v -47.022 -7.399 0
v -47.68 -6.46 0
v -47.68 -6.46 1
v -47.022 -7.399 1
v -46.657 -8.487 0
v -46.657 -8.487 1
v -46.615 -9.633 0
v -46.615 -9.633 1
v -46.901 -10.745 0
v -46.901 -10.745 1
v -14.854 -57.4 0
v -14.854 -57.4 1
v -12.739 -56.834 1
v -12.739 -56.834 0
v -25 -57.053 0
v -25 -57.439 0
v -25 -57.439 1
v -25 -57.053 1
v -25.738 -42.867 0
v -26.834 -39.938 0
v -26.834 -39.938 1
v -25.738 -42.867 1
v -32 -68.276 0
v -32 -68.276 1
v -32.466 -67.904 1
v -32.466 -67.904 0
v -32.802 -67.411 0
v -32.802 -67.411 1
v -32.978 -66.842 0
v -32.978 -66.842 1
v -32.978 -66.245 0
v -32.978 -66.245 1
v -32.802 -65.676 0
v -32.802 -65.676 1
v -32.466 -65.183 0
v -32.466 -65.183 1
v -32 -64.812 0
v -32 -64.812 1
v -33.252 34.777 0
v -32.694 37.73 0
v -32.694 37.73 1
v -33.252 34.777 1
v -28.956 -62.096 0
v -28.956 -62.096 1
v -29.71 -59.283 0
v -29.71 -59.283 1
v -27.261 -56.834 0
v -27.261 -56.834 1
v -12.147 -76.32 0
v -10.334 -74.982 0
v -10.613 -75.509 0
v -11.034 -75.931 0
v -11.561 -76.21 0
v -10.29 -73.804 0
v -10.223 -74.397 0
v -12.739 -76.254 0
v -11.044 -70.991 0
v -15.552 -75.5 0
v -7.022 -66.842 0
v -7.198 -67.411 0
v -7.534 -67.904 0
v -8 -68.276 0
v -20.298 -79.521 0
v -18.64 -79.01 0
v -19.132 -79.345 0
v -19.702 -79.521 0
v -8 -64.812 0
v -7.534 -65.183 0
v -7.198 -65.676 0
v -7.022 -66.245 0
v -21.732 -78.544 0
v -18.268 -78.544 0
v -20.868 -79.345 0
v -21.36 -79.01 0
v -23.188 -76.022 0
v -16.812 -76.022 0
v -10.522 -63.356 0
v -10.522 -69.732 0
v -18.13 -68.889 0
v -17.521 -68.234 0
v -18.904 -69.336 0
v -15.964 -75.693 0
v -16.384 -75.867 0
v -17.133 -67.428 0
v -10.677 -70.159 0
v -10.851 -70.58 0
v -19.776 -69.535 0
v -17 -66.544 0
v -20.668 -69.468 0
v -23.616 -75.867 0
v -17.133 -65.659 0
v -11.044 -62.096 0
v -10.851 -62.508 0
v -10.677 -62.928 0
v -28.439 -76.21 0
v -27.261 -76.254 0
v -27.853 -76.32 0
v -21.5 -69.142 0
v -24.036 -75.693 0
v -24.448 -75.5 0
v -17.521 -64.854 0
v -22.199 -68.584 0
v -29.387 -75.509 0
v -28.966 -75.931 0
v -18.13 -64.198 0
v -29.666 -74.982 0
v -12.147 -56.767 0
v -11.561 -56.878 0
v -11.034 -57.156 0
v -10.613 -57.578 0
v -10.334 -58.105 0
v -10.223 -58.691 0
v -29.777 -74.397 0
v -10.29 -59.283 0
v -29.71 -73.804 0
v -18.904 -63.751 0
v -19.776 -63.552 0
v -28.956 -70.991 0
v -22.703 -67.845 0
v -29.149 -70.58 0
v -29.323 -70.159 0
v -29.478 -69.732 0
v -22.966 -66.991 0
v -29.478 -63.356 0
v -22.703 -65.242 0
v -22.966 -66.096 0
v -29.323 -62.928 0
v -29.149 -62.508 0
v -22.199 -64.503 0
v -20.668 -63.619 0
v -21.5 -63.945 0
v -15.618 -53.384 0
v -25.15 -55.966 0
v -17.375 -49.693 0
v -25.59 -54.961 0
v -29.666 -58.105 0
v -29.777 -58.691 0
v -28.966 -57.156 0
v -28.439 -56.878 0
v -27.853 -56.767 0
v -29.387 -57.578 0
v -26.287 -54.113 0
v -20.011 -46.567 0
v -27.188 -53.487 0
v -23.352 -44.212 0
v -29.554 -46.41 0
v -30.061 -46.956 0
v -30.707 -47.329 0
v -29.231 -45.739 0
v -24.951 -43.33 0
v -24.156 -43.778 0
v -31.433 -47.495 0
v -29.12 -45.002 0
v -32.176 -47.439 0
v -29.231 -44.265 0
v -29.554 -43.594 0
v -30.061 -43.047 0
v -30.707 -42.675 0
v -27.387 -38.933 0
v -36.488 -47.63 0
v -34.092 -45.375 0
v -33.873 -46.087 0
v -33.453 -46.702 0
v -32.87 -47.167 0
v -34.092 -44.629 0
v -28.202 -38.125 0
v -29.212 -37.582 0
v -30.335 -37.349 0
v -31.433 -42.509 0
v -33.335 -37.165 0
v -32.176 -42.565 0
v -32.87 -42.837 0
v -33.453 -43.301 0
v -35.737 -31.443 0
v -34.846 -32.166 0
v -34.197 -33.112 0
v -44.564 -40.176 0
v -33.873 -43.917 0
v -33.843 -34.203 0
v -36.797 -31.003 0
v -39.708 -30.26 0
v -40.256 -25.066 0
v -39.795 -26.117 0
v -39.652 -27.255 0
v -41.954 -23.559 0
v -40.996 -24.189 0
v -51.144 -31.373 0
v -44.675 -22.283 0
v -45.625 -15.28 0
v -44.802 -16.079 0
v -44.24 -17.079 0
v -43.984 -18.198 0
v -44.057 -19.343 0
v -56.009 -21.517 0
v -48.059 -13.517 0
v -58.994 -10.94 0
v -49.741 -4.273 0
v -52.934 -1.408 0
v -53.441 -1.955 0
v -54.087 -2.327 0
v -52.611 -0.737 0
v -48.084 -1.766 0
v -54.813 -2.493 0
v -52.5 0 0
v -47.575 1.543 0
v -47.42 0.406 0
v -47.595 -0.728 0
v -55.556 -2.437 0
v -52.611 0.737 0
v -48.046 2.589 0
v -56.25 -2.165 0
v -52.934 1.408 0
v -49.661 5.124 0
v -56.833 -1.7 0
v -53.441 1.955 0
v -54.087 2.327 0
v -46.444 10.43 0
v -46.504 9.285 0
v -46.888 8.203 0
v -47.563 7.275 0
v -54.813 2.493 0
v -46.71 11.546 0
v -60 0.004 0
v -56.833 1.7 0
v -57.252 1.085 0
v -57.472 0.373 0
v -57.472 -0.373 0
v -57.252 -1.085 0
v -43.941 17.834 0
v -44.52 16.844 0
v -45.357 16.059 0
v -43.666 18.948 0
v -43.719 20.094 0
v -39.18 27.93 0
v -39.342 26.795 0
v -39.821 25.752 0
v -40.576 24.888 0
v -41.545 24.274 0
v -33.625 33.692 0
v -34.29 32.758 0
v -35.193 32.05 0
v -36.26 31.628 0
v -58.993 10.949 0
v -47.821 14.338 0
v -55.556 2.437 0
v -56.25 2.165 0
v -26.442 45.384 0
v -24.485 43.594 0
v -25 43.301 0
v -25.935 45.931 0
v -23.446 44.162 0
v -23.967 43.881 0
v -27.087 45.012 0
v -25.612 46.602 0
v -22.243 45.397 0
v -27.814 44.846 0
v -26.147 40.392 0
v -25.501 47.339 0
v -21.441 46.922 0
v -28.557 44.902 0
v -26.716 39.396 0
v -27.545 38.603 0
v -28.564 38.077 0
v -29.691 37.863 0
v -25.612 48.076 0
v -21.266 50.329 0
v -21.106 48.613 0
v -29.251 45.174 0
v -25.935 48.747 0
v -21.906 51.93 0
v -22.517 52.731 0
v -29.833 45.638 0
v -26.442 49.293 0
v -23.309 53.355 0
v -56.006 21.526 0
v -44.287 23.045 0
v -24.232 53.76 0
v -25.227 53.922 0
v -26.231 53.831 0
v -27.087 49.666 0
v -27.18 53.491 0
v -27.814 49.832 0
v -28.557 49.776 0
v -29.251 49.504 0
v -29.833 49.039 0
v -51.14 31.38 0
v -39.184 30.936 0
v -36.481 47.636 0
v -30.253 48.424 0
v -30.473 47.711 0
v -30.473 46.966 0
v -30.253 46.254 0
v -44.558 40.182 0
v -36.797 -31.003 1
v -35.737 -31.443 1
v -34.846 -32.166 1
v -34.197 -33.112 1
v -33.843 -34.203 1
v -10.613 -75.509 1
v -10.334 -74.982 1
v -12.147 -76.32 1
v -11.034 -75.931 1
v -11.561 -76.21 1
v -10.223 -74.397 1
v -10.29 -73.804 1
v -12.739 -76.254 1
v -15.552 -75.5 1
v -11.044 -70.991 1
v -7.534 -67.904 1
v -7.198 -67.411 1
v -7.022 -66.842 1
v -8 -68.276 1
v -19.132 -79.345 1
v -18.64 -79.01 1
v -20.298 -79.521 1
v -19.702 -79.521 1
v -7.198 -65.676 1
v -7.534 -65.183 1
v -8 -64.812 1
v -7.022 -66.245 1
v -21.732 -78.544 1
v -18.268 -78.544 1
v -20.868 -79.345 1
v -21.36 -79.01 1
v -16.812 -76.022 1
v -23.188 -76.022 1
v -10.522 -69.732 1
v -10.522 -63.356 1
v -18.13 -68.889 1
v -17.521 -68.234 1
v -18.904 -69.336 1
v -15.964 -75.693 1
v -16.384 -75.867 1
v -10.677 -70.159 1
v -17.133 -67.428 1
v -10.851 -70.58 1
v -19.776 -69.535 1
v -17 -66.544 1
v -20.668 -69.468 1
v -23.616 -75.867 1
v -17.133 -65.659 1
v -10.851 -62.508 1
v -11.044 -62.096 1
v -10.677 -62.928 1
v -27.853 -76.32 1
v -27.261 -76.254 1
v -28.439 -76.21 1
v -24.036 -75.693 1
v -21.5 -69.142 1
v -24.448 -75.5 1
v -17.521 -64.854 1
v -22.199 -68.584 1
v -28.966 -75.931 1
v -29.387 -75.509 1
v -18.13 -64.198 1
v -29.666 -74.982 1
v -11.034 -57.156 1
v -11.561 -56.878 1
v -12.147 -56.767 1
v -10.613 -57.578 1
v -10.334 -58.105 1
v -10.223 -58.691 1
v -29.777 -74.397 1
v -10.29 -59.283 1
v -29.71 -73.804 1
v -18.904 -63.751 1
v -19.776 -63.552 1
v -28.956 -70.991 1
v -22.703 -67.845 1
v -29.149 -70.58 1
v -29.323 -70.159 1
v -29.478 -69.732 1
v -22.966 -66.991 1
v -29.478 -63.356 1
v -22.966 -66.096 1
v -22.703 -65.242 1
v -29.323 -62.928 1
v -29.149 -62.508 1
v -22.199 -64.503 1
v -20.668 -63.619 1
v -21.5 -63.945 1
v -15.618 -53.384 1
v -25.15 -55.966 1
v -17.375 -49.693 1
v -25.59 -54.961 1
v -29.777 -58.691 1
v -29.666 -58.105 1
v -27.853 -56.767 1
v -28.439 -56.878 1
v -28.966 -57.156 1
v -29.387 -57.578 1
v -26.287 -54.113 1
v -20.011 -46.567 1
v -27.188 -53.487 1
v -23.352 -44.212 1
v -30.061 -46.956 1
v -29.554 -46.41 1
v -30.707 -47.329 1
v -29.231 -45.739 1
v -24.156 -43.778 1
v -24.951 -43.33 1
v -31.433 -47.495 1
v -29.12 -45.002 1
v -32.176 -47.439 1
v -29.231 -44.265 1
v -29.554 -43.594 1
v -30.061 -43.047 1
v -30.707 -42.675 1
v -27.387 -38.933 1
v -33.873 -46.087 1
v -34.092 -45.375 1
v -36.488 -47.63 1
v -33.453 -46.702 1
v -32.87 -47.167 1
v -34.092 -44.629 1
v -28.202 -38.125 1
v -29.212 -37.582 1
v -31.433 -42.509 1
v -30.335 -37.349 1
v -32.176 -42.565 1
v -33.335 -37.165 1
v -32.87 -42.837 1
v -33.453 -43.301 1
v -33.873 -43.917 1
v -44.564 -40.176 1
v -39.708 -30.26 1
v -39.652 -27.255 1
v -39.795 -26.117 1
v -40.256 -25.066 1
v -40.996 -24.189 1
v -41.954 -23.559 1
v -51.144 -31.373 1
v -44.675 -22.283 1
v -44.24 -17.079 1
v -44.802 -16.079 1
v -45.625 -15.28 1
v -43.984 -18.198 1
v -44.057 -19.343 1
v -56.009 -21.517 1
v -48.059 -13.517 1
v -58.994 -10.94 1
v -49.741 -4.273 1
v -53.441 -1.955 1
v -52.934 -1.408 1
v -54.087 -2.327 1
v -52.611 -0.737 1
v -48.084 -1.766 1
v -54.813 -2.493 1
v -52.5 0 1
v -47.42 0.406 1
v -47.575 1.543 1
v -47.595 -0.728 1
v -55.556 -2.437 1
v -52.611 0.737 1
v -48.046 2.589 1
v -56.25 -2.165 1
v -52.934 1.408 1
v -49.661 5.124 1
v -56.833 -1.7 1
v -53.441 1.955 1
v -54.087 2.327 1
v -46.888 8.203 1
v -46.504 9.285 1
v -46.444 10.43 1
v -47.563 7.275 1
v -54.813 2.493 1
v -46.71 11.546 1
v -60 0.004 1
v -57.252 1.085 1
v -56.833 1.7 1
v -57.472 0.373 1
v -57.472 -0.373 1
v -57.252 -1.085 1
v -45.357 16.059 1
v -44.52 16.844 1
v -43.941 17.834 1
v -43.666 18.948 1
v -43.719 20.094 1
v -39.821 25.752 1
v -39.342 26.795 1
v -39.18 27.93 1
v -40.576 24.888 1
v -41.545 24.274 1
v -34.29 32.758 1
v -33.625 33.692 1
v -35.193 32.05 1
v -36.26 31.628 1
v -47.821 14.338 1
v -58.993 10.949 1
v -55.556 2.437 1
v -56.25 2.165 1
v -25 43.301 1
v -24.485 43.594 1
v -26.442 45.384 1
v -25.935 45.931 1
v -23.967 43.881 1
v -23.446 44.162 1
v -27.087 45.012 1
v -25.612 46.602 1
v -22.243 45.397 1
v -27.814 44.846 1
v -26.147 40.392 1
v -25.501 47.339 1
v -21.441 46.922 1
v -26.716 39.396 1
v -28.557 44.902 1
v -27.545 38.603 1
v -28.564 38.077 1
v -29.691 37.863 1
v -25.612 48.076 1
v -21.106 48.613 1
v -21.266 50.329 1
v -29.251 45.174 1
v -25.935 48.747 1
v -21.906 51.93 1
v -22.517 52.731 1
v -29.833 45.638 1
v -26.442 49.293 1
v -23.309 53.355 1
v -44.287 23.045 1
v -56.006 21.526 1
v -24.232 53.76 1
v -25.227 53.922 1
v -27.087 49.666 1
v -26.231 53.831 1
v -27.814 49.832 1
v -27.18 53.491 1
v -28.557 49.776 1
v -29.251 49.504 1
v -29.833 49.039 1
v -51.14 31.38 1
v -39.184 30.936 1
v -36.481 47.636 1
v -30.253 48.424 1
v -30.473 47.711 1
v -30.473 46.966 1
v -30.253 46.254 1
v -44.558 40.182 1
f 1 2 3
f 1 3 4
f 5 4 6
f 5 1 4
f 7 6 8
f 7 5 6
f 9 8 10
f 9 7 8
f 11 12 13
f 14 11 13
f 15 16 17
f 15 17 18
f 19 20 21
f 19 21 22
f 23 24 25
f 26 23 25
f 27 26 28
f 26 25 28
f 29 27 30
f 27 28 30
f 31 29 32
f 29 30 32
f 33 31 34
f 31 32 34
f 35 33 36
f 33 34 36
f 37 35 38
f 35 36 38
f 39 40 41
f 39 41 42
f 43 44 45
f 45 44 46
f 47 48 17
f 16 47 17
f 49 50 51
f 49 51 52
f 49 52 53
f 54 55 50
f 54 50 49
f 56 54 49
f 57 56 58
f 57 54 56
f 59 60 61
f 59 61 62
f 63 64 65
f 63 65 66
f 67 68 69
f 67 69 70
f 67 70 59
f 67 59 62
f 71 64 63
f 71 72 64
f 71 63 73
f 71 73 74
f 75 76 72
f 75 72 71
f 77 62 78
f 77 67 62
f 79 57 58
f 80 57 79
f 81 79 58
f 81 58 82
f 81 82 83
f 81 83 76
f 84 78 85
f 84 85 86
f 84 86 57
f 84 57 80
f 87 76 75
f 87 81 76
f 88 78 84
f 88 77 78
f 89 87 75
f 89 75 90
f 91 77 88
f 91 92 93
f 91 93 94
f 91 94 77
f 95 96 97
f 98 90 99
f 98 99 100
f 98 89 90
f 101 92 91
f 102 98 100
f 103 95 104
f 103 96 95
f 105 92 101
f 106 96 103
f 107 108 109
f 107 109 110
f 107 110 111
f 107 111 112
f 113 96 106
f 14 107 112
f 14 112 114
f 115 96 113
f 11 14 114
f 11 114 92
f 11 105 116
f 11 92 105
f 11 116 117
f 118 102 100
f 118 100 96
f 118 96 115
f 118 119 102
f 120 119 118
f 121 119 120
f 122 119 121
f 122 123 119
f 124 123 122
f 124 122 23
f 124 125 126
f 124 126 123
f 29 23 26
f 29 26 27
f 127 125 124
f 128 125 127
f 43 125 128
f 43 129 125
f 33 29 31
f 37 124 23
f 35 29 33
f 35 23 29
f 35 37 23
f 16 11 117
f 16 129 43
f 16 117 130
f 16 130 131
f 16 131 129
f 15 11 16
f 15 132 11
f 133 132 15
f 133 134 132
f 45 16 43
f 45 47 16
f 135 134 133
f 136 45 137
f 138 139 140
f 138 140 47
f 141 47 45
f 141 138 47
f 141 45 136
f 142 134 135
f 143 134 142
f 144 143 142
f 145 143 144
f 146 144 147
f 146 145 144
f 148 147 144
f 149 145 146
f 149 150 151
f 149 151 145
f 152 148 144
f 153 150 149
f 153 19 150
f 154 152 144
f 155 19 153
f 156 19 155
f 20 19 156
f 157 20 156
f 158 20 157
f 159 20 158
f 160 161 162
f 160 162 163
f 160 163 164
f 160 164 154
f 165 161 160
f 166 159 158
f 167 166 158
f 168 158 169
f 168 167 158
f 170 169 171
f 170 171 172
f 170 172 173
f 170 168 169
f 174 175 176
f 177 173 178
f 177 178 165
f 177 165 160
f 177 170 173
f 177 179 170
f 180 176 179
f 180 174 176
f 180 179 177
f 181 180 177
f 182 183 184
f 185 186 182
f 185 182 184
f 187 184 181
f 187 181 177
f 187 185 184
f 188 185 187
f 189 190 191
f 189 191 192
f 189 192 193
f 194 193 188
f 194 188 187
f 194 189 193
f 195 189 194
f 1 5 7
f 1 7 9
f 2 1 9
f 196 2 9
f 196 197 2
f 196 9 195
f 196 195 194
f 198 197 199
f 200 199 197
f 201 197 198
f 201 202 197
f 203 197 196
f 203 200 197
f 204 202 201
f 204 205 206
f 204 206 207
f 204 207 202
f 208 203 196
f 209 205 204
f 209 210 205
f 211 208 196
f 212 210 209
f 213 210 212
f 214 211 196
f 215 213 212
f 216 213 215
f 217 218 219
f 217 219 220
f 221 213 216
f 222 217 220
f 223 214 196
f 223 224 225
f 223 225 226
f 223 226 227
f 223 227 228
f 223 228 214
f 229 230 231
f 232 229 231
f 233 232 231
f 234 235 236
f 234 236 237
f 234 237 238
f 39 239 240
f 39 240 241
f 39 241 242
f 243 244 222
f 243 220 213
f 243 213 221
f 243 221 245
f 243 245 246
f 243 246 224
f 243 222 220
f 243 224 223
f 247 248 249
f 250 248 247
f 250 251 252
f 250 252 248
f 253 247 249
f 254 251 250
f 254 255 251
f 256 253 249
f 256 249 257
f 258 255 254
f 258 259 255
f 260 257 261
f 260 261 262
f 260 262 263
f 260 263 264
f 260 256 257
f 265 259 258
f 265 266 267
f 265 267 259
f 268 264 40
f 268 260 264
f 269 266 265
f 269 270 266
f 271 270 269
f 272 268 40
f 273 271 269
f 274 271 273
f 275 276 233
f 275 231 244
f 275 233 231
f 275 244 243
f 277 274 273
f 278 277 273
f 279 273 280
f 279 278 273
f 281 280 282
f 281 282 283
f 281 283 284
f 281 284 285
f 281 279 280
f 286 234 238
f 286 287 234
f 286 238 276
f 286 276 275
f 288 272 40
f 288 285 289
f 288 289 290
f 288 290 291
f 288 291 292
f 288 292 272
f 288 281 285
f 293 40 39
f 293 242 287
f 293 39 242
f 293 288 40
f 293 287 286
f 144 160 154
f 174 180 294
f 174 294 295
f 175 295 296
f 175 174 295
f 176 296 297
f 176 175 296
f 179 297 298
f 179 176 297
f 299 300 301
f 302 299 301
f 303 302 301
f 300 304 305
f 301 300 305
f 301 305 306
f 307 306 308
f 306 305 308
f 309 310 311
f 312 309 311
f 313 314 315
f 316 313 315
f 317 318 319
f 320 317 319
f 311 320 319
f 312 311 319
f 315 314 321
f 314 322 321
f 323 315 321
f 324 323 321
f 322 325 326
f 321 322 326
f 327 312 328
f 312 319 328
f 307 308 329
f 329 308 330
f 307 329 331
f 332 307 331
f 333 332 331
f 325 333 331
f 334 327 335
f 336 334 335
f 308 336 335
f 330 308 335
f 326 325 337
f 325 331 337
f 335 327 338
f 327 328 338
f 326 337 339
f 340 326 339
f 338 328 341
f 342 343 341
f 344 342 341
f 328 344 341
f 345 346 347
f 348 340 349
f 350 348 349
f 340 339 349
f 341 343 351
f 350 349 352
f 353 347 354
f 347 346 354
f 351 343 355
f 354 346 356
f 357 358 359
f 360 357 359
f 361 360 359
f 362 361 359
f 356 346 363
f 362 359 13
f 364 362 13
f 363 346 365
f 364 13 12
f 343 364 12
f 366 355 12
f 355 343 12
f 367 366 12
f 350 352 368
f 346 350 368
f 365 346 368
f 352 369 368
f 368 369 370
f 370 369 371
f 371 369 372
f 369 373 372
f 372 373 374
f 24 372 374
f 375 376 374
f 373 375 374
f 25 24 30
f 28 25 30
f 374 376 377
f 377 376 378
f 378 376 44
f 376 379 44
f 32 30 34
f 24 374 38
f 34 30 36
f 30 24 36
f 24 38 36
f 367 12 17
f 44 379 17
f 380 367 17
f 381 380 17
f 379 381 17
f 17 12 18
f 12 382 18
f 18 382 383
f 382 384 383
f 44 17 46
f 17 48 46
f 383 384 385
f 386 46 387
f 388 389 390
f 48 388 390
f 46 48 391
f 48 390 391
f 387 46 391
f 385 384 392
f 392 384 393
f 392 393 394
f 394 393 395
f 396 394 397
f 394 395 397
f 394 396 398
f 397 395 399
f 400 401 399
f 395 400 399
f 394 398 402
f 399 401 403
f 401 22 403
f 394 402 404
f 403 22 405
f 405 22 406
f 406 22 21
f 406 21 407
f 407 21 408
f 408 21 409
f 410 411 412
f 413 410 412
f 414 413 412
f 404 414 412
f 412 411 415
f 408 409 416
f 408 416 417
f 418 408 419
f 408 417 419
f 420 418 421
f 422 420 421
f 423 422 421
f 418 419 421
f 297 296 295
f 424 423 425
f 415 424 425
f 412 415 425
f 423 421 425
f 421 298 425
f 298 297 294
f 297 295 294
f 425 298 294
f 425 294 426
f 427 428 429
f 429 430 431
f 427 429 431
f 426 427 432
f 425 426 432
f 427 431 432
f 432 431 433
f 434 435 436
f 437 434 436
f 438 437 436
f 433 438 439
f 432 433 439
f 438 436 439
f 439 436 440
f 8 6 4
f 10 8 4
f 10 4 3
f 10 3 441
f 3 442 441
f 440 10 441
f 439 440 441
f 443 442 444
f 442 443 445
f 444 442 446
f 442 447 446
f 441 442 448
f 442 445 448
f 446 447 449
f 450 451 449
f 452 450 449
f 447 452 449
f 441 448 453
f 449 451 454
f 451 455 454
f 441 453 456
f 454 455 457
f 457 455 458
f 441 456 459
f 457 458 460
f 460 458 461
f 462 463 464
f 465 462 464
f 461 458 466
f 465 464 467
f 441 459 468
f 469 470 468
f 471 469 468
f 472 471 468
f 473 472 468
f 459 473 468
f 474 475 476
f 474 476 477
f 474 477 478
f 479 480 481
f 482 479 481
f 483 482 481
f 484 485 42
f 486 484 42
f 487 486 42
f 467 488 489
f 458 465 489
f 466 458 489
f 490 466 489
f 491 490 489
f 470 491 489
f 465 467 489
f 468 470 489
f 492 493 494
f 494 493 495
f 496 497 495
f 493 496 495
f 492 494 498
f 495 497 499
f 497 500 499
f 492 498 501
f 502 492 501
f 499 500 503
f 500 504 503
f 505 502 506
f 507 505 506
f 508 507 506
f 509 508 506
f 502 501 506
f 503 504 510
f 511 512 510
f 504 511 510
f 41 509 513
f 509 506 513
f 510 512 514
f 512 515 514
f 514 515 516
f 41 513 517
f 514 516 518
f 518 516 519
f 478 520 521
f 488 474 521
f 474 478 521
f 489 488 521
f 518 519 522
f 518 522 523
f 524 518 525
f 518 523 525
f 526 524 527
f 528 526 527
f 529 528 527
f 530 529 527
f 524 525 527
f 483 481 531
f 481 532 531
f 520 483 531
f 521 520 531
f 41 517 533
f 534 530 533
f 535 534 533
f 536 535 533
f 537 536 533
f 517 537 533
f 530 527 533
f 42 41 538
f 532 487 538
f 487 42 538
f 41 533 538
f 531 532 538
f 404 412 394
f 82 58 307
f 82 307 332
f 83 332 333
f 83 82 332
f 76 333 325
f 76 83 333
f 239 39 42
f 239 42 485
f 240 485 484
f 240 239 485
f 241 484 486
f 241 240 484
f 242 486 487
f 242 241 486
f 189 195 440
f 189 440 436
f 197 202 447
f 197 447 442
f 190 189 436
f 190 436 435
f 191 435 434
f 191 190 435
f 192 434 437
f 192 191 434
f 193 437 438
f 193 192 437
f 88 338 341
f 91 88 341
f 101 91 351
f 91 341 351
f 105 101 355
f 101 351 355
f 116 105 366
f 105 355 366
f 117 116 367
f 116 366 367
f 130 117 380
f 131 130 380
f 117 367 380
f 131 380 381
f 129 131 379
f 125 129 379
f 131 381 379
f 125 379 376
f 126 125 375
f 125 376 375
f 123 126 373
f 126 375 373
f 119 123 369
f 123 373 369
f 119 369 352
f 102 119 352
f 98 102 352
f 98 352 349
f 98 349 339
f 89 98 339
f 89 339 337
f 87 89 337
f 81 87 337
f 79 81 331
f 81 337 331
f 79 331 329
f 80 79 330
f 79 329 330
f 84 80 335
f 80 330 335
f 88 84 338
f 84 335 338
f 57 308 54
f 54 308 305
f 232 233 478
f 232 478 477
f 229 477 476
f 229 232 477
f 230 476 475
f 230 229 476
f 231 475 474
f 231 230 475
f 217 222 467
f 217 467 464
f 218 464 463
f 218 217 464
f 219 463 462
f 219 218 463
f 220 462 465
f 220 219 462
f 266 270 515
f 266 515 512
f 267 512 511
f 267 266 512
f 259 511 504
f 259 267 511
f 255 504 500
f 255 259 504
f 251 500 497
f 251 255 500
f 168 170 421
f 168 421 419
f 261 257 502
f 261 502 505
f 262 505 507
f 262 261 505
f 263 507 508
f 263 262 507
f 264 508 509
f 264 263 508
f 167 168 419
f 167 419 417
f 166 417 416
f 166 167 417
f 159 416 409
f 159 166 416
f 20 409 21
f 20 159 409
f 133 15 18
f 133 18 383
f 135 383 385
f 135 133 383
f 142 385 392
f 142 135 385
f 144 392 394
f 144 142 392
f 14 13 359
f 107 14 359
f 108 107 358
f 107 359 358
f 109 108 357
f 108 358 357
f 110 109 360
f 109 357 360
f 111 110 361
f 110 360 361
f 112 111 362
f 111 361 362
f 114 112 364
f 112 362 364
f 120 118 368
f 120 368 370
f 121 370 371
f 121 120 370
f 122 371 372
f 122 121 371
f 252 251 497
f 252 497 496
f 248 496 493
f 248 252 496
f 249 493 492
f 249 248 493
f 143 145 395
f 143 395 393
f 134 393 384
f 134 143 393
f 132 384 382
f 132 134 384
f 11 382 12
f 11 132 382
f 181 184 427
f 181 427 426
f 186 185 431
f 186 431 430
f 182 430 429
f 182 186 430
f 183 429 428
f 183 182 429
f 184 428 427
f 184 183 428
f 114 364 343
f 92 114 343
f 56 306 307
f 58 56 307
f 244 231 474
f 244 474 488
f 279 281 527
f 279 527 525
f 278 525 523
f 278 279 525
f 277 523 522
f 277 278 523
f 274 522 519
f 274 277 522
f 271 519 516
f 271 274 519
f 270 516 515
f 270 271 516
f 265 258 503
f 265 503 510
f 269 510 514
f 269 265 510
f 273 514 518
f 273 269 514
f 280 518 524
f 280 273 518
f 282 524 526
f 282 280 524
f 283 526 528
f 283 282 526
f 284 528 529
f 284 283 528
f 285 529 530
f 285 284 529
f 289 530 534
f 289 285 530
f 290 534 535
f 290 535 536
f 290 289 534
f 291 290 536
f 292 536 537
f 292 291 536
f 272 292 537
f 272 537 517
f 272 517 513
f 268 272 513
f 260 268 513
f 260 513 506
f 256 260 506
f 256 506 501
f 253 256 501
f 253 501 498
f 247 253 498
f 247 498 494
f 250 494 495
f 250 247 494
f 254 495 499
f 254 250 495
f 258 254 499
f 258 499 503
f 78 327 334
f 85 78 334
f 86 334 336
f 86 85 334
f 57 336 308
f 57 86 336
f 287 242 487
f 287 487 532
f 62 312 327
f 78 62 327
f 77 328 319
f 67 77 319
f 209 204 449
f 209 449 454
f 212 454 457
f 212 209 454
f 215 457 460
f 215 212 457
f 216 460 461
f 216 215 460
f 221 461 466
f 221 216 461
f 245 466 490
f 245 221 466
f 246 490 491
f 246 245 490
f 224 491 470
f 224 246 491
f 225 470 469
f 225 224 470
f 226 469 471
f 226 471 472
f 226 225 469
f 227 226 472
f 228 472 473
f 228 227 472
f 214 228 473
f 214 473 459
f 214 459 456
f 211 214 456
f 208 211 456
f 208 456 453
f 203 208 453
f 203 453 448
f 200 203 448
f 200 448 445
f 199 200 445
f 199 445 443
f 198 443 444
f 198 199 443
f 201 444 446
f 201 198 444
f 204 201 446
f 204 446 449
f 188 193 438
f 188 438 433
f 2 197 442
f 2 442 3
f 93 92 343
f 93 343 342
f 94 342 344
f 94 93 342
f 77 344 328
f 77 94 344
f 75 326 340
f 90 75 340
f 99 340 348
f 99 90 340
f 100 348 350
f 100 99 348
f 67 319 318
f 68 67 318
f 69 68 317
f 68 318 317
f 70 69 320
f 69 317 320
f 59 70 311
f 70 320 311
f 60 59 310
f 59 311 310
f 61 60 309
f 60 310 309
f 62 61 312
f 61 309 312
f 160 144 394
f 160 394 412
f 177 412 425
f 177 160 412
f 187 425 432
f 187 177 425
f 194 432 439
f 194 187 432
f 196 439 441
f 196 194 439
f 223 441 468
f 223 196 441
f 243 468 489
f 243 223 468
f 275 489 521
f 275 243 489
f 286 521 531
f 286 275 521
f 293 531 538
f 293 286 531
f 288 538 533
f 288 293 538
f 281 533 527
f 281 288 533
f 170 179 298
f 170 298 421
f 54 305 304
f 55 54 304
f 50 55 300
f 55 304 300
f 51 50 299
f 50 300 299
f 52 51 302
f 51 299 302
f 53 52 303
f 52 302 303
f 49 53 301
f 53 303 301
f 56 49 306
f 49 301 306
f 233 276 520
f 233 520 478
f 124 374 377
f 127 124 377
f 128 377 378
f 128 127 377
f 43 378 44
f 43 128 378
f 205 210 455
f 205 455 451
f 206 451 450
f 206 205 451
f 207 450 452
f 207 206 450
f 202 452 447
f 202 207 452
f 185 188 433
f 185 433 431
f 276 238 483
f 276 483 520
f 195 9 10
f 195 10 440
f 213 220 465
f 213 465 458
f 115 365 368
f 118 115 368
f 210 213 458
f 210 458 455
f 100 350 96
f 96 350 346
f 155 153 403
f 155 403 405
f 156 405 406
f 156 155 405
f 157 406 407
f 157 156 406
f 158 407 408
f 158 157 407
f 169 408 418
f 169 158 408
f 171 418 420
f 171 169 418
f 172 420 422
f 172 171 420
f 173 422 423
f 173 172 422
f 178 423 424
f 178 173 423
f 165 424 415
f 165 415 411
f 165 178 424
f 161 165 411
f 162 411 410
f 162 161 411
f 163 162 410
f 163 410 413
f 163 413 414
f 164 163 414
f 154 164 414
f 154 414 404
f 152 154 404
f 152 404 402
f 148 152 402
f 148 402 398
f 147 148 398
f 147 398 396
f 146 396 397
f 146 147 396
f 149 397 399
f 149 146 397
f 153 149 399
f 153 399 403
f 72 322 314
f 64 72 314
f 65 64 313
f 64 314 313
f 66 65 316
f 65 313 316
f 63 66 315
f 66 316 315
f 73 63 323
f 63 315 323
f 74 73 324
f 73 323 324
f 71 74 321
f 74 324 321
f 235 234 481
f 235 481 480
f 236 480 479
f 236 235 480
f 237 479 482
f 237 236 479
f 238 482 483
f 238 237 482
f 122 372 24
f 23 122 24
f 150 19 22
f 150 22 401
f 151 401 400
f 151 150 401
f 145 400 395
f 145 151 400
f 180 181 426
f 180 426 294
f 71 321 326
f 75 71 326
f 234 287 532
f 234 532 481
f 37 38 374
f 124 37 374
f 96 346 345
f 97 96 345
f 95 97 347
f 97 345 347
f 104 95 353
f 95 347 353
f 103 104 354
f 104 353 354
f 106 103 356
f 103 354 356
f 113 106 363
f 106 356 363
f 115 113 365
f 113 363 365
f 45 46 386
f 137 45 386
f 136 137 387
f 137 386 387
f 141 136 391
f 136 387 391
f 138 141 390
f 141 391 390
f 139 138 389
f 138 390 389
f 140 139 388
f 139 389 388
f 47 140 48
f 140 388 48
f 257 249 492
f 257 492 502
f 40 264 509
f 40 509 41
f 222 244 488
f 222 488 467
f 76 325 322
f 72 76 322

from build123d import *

# Parameters (mm, degrees)
IZIM1_R                     = 5
IZIM1_R_2                   = 2.5
Y_KSEKLIK_EKSTR_ZYON2_DEPTH = 1
IZIM2_R                     = 3
Y_KSEKLIK_EKSTR_ZYON4_DEPTH = 1


with BuildPart() as part:
    # Çizim1 → Yükseklik-Ekstrüzyon2 (new body)
    with BuildSketch(Plane.XY):
        with BuildLine():
            Line((-25, 43.301270189), (-26.146521576, 40.39207739))
            ThreePointArc((-26.146521576, 40.39207739), (-27.544598222, 38.602623821), (-29.691484877, 37.862596744))
            Line((-29.691484877, 37.862596744), (-32.693673826, 37.730024144))
            Line((-32.693673826, 37.730024144), (-33.252115355, 34.777253066))
            ThreePointArc((-33.252115355, 34.777253066), (-34.290118058, 32.757522199), (-36.260310201, 31.628316593))
            Line((-36.260310201, 31.628316593), (-39.184480502, 30.935538106))
            Line((-39.184480502, 30.935538106), (-39.17973637, 27.930427214))
            ThreePointArc((-39.17973637, 27.930427214), (-39.820893366, 25.751969023), (-41.54459596, 24.273587558))
            Line((-41.54459596, 24.273587558), (-44.287157421, 23.045145208))
            Line((-44.287157421, 23.045145208), (-43.719395692, 20.094152054))
            ThreePointArc((-43.719395692, 20.094152054), (-43.940993675, 17.834139505), (-45.357143694, 16.058954583))
            Line((-45.357143694, 16.058954583), (-47.82093971, 14.338366552))
            Line((-47.82093971, 14.338366552), (-46.710273625, 11.546031539))
            ThreePointArc((-46.710273625, 11.546031539), (-46.504462376, 9.284526705), (-47.562892001, 7.275425136))
            Line((-47.562892001, 7.275425136), (-49.660641368, 5.123644113))
            Line((-49.660641368, 5.123644113), (-48.046416828, 2.588887101))
            ThreePointArc((-48.046416828, 2.588887101), (-47.420487313, 0.406004917), (-48.083701146, -1.765839874))
            Line((-48.083701146, -1.765839874), (-49.741090048, -4.272585973))
            Line((-49.741090048, -4.272585973), (-47.680491761, -6.459969953))
            ThreePointArc((-47.680491761, -6.459969953), (-46.656617846, -8.486899797), (-46.901121207, -10.744549126))
            Line((-46.901121207, -10.744549126), (-48.059435816, -13.517457571))
            Line((-48.059435816, -13.517457571), (-45.625461503, -15.279979352))
            ThreePointArc((-45.625461503, -15.279979352), (-44.239914432, -17.079151855), (-44.057045667, -19.342627369))
            Line((-44.057045667, -19.342627369), (-44.675252109, -22.283466496))
            Line((-44.675252109, -22.283466496), (-41.954126526, -23.558687864))
            ThreePointArc((-41.954126526, -23.558687864), (-40.255989993, -25.066366444), (-39.652227319, -27.255483394))
            Line((-39.652227319, -27.255483394), (-39.708425324, -30.260072511))
            Line((-39.708425324, -30.260072511), (-36.7965457, -31.002818113))
            ThreePointArc((-36.7965457, -31.002818113), (-34.84597704, -32.165592505), (-33.842709051, -34.202800331))
            Line((-33.842709051, -34.202800331), (-33.334907776, -37.164700371))
            Line((-33.334907776, -37.164700371), (-30.335428898, -37.348658075))
            ThreePointArc((-30.335428898, -37.348658075), (-28.201527977, -38.125336415), (-26.834295942, -39.938466016))
            Line((-26.834295942, -39.938466016), (-25.73775467, -42.866863479))
            ThreePointArc((-25.73775467, -42.866863479), (-24.554196145, -43.55561332), (-23.352220135, -44.21169319))
            ThreePointArc((-23.352220135, -44.21169319), (-17.219408632, -49.939828574), (-14.829333353, -57.984109281))
            ThreePointArc((-14.829333353, -57.984109281), (-20.099106379, -76.543069457), (-25, -57.883306535))
            Line((-25, -57.883306535), (-25, -57.052607302))
            ThreePointArc((-25, -57.052607302), (-25.590454576, -54.960957236), (-27.1875, -53.486819346))
            ThreePointArc((-27.1875, -53.486819346), (-59.999999835, 0.004450967), (-27.179564099, 53.490852446))
            ThreePointArc((-27.179564099, 53.490852446), (-24.232021318, 53.76021953), (-21.906244367, 51.929556087))
            ThreePointArc((-21.906244367, 51.929556087), (-21.212806241, 47.755648425), (-23.446136356, 44.161959762))
            ThreePointArc((-23.446136356, 44.161959762), (-24.226890609, 43.73851588), (-25, 43.301270189))
        make_face()
        with Locations((-20, -66.543560573)):
            Circle(IZIM1_R, mode=Mode.SUBTRACT)
        with Locations((-31.620079453, -45.001895242)):
            Circle(IZIM1_R_2, mode=Mode.SUBTRACT)
        with Locations((-55, 0)):
            Circle(IZIM1_R_2, mode=Mode.SUBTRACT)
        with Locations((-28.000624989, 47.338831842)):
            Circle(IZIM1_R_2, mode=Mode.SUBTRACT)
    extrude(amount=Y_KSEKLIK_EKSTR_ZYON2_DEPTH)

    # Çizim2 → Yükseklik-Ekstrüzyon4 (add)
    with BuildSketch(Plane.XY.offset(1)):
        with BuildLine():
            Line((-8, -68.275611381), (-10.601540351, -69.777611403))
            ThreePointArc((-10.601540351, -69.777611403), (-11.025419883, -70.260953374), (-11.067466177, -70.902455852))
            Line((-11.067466177, -70.902455852), (-10.289973754, -73.804097076))
            ThreePointArc((-10.289973754, -73.804097076), (-10.807611845, -75.735948729), (-12.739463497, -76.253586819))
            Line((-12.739463497, -76.253586819), (-15.641104722, -75.476094396))
            ThreePointArc((-15.641104722, -75.476094396), (-16.282607199, -75.51814069), (-16.765949171, -75.942020222))
            Line((-16.765949171, -75.942020222), (-18.267949192, -78.543560573))
            ThreePointArc((-18.267949192, -78.543560573), (-20, -79.543560573), (-21.732050808, -78.543560573))
            Line((-21.732050808, -78.543560573), (-23.234050829, -75.942020222))
            ThreePointArc((-23.234050829, -75.942020222), (-23.717392801, -75.51814069), (-24.358895278, -75.476094396))
            Line((-24.358895278, -75.476094396), (-27.260536503, -76.253586819))
            ThreePointArc((-27.260536503, -76.253586819), (-29.192388155, -75.735948729), (-29.710026246, -73.804097076))
            Line((-29.710026246, -73.804097076), (-28.932533823, -70.902455852))
            ThreePointArc((-28.932533823, -70.902455852), (-28.974580117, -70.260953374), (-29.398459649, -69.777611403))
            Line((-29.398459649, -69.777611403), (-32, -68.275611381))
            ThreePointArc((-32, -68.275611381), (-33, -66.543560573), (-32, -64.811509766))
            Line((-32, -64.811509766), (-29.398459649, -63.309509744))
            ThreePointArc((-29.398459649, -63.309509744), (-28.974580117, -62.826167772), (-28.932533823, -62.184665295))
            Line((-28.932533823, -62.184665295), (-29.710026246, -59.28302407))
            ThreePointArc((-29.710026246, -59.28302407), (-29.192388155, -57.351172418), (-27.260536503, -56.833534328))
            Line((-27.260536503, -56.833534328), (-24.358895278, -57.61102675))
            ThreePointArc((-24.358895278, -57.61102675), (-23.717392801, -57.568980457), (-23.234050829, -57.145100924))
            Line((-23.234050829, -57.145100924), (-21.732050808, -54.543560573))
            ThreePointArc((-21.732050808, -54.543560573), (-20, -53.543560573), (-18.267949192, -54.543560573))
            Line((-18.267949192, -54.543560573), (-16.765949171, -57.145100924))
            ThreePointArc((-16.765949171, -57.145100924), (-16.282607199, -57.568980457), (-15.641104722, -57.61102675))
            Line((-15.641104722, -57.61102675), (-12.739463497, -56.833534328))
            ThreePointArc((-12.739463497, -56.833534328), (-10.807611845, -57.351172418), (-10.289973754, -59.28302407))
            Line((-10.289973754, -59.28302407), (-11.067466177, -62.184665295))
            ThreePointArc((-11.067466177, -62.184665295), (-11.025419883, -62.826167772), (-10.601540351, -63.309509744))
            Line((-10.601540351, -63.309509744), (-8, -64.811509766))
            ThreePointArc((-8, -64.811509766), (-7, -66.543560573), (-8, -68.275611381))
        make_face()
        with Locations((-20, -66.543560573)):
            Circle(IZIM2_R, mode=Mode.SUBTRACT)
    extrude(amount=-Y_KSEKLIK_EKSTR_ZYON4_DEPTH)


solid = part.part
